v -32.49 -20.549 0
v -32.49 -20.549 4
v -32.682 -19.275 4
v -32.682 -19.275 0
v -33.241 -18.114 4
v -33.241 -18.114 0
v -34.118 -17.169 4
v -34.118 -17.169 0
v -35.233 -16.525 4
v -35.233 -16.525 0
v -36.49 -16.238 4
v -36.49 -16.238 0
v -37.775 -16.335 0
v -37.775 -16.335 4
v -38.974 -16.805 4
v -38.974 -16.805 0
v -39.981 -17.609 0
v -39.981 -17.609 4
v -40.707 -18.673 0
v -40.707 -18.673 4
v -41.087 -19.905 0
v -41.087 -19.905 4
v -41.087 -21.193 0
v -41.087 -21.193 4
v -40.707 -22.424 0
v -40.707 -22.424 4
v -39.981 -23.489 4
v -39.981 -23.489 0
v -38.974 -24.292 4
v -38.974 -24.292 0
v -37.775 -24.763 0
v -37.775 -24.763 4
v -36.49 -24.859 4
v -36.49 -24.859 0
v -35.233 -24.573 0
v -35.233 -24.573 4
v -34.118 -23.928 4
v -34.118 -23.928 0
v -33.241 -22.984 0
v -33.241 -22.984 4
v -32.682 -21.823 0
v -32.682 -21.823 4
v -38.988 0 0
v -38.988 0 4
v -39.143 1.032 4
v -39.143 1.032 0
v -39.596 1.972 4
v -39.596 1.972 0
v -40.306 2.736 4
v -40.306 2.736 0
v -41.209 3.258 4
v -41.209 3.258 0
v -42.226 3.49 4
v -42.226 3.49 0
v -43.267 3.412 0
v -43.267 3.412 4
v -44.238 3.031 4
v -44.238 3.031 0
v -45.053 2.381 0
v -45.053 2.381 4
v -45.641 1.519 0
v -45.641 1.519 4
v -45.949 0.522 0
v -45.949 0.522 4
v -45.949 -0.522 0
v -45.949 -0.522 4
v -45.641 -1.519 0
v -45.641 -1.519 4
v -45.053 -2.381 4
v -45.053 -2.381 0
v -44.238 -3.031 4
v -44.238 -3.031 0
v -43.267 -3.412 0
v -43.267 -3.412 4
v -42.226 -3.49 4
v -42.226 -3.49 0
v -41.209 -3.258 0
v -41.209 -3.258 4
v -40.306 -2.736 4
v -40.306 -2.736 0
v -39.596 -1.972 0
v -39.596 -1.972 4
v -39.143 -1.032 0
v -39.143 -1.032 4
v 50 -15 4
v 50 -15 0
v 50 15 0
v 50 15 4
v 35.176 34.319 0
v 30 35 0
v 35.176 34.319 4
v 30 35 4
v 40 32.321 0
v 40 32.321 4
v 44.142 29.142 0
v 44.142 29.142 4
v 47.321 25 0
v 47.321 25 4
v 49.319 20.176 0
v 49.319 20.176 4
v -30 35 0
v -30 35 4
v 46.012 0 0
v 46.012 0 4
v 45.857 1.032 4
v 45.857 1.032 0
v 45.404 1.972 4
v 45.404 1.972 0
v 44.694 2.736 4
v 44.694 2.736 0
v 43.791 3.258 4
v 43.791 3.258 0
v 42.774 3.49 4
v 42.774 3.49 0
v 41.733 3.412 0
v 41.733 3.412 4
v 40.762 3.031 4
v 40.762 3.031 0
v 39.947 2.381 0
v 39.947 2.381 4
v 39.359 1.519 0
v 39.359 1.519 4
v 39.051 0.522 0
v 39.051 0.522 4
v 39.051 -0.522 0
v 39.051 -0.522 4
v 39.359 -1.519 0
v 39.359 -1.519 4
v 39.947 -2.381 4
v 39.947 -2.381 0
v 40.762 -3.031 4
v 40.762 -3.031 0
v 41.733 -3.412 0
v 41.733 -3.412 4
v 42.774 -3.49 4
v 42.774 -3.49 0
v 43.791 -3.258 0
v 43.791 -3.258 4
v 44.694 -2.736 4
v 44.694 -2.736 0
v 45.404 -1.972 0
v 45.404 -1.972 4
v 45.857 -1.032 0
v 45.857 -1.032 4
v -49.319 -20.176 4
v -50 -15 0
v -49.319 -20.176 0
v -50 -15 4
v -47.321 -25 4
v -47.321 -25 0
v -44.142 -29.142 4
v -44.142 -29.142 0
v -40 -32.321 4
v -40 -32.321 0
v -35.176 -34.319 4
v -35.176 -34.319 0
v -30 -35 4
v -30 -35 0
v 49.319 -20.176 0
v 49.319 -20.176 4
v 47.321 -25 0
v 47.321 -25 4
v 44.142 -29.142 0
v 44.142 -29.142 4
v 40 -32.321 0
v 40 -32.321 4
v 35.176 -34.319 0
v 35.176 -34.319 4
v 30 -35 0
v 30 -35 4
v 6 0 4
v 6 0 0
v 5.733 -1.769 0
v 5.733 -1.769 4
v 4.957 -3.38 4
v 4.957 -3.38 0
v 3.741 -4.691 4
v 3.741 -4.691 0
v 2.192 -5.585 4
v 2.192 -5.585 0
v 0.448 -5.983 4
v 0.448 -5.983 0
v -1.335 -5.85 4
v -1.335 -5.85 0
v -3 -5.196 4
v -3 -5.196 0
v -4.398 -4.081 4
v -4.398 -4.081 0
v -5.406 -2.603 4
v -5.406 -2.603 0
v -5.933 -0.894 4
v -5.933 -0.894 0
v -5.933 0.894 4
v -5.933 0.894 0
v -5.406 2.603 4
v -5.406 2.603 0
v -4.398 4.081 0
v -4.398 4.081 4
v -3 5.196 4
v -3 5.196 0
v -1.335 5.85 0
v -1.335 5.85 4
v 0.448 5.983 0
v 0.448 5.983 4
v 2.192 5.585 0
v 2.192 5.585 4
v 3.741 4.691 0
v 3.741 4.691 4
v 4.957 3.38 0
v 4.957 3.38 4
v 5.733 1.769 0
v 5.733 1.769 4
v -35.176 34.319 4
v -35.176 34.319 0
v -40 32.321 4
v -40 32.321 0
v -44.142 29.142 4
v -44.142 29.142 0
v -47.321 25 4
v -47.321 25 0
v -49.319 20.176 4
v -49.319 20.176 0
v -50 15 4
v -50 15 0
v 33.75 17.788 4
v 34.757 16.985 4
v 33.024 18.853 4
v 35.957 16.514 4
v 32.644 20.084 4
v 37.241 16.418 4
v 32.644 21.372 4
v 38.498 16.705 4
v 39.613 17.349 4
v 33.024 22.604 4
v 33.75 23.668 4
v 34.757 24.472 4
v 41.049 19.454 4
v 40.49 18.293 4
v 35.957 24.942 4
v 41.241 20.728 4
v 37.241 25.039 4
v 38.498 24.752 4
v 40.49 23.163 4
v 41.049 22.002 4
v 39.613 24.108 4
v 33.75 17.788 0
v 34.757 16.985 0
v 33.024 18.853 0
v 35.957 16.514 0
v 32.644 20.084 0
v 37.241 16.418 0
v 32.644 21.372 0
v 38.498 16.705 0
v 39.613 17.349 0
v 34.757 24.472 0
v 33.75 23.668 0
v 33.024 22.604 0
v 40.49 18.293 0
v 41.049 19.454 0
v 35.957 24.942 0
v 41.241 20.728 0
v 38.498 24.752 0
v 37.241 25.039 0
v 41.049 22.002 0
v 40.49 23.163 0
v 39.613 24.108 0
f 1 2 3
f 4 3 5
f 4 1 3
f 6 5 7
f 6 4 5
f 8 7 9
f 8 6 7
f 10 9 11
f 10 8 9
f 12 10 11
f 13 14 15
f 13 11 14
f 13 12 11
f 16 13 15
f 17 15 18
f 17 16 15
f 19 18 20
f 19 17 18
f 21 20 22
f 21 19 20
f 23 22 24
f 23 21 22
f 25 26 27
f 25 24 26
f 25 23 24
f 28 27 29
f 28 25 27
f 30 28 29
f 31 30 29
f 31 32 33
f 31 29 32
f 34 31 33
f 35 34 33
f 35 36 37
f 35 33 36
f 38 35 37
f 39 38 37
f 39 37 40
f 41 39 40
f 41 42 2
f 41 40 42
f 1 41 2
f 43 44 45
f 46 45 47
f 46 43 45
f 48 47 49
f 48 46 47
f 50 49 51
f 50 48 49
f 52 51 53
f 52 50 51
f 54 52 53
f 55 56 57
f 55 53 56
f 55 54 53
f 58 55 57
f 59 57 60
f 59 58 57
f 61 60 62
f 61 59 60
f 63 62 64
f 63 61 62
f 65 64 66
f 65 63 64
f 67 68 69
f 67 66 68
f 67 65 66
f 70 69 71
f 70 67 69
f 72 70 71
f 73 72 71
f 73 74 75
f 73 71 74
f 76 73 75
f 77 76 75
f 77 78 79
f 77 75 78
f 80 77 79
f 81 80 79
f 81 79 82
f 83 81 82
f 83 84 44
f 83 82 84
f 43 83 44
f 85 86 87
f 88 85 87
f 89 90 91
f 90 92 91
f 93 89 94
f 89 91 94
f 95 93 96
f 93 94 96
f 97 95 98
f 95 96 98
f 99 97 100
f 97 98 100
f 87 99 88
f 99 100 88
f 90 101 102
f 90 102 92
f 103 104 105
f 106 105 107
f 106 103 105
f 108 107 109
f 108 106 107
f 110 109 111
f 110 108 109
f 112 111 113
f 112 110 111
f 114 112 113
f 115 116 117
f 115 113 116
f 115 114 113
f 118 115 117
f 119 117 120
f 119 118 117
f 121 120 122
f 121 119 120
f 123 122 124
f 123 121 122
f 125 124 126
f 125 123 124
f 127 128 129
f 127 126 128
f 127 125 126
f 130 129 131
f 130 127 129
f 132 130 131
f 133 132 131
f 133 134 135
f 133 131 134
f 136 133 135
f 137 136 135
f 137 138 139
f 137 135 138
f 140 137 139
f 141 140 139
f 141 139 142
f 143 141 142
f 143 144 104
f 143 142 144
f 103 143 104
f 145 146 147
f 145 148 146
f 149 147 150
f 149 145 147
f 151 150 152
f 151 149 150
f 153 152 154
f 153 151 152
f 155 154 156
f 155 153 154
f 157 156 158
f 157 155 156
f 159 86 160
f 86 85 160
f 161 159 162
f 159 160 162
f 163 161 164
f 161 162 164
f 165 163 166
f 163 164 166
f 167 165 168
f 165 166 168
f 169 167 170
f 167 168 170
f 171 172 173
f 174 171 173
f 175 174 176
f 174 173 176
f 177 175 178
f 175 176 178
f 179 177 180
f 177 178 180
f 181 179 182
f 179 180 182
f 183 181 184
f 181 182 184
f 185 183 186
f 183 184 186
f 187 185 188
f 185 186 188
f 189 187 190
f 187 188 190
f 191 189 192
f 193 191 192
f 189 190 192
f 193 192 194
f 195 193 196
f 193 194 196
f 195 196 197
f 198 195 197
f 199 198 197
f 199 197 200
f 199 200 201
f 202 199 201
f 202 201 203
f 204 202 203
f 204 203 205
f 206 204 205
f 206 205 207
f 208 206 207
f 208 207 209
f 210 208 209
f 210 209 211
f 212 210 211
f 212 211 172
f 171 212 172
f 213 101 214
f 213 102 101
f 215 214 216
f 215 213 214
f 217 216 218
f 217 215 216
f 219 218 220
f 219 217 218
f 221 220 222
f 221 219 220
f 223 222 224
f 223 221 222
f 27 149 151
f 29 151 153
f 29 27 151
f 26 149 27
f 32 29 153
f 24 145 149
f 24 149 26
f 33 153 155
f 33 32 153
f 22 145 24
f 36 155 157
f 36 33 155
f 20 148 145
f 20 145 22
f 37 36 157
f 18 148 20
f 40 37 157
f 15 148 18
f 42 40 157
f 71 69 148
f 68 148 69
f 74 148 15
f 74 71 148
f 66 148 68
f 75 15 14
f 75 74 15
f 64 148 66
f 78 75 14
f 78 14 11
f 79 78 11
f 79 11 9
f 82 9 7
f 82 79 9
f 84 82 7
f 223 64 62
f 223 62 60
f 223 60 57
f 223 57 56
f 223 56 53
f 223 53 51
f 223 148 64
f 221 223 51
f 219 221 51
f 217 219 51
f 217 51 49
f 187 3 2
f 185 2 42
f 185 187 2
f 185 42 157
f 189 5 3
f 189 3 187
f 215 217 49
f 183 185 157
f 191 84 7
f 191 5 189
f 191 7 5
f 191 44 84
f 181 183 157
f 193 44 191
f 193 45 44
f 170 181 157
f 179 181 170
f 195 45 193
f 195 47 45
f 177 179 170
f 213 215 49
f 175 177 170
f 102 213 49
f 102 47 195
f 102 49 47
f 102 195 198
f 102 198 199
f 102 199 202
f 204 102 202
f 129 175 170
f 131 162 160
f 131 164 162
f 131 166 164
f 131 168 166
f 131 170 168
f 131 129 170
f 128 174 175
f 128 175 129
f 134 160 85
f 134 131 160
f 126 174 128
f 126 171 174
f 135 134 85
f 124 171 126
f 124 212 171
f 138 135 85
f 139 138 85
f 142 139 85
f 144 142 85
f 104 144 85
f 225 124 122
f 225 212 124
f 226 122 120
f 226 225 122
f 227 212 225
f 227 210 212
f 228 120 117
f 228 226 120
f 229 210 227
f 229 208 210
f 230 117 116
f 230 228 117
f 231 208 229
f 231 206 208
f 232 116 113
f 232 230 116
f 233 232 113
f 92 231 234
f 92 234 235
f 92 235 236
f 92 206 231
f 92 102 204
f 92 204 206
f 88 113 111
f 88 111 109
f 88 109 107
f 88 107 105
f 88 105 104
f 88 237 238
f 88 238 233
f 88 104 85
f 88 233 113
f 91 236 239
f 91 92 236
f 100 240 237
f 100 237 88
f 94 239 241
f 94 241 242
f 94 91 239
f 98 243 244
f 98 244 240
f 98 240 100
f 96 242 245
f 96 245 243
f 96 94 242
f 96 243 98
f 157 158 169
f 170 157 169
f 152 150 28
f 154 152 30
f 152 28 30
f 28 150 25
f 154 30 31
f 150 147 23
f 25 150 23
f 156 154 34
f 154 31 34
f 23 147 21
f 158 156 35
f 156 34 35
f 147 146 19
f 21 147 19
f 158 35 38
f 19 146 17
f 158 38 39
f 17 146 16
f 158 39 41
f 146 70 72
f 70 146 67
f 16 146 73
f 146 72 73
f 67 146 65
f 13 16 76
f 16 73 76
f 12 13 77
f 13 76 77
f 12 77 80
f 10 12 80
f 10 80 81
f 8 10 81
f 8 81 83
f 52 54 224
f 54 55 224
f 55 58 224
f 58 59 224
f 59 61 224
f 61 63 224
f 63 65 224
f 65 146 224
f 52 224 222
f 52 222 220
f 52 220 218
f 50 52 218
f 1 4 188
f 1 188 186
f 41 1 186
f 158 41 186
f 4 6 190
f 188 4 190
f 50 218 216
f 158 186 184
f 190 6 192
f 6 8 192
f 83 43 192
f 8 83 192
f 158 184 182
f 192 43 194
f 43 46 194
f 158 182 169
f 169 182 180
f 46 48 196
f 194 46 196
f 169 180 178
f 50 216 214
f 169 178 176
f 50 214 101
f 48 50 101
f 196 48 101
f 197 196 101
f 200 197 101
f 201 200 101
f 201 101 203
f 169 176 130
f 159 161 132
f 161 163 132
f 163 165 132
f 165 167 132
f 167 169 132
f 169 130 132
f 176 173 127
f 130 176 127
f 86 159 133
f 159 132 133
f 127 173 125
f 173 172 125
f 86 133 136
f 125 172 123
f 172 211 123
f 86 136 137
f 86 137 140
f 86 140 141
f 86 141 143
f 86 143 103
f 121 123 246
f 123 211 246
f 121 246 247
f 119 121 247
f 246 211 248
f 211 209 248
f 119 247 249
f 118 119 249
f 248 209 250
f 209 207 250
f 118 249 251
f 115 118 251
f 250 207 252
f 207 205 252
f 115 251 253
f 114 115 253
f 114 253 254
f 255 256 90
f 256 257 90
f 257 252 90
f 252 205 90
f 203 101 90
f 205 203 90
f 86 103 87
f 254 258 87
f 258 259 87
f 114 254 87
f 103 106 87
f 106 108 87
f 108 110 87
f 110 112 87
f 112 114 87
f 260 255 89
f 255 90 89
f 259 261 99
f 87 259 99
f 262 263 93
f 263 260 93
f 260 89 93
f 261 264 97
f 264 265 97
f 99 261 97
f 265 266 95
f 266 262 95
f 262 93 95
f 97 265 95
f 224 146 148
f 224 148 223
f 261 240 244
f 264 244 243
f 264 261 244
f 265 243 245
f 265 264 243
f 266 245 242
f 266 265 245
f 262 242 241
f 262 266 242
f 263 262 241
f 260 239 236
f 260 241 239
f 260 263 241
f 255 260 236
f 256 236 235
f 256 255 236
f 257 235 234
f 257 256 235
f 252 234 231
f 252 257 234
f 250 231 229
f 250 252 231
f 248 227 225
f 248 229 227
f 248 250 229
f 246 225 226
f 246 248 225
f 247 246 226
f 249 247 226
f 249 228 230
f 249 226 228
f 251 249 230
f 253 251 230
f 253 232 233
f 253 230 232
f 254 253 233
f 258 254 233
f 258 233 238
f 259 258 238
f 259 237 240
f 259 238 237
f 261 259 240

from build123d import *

# Parameters (mm, degrees)
F0_W      = 100
F0_H      = 70
F3_DEPTH  = 4
F2_R      = 4.322492
F4_DEPTH  = 5
F1_R      = 3.5
F5_DEPTH  = 5
F6_R      = 20
F7_R      = 20
F8_R      = 20
F9_R      = 20
F10_R     = 6
F11_DEPTH = 5


with BuildPart() as f3:
    # F0 (on Top) → F3 (new body)
    with BuildSketch(Plane.XY):
        Rectangle(F0_W, F0_H)
    extrude(amount=F3_DEPTH)

    # F2 (on Top) → F4 (cut)
    with BuildSketch(Plane.XY):
        with Locations((36.918391, 20.728212)):
            Circle(F2_R)
        with Locations((-36.812667, -20.548884)):
            Circle(F2_R)
    extrude(amount=F4_DEPTH, mode=Mode.SUBTRACT)

    # F1 (on face) → F5 (cut)
    with BuildSketch(Plane.XY):
        with Locations((-42.48777, 0)):
            Circle(F1_R)
        with Locations((42.51223, 0)):
            Circle(F1_R)
    extrude(amount=F5_DEPTH, mode=Mode.SUBTRACT)

    # F6
    f6_edges = [f3.edges().sort_by_distance(p)[0] for p in [
        (-50, -35, 2),
    ]]
    fillet(f6_edges, radius=F6_R)

    # F7
    f7_edges = [f3.edges().sort_by_distance(p)[0] for p in [
        (50, 35, 2),
    ]]
    fillet(f7_edges, radius=F7_R)

    # F8
    f8_edges = [f3.edges().sort_by_distance(p)[0] for p in [
        (50, -35, 2),
    ]]
    fillet(f8_edges, radius=F8_R)

    # F9
    f9_edges = [f3.edges().sort_by_distance(p)[0] for p in [
        (-50, 35, 2),
    ]]
    fillet(f9_edges, radius=F9_R)

    # F10 (on face) → F11 (cut)
    with BuildSketch(Plane(origin=(0, 0, 0), x_dir=(1, 0, 0), z_dir=(0, 0, -1))):
        Circle(F10_R)
    extrude(amount=-F11_DEPTH, mode=Mode.SUBTRACT)


solid = f3.part
